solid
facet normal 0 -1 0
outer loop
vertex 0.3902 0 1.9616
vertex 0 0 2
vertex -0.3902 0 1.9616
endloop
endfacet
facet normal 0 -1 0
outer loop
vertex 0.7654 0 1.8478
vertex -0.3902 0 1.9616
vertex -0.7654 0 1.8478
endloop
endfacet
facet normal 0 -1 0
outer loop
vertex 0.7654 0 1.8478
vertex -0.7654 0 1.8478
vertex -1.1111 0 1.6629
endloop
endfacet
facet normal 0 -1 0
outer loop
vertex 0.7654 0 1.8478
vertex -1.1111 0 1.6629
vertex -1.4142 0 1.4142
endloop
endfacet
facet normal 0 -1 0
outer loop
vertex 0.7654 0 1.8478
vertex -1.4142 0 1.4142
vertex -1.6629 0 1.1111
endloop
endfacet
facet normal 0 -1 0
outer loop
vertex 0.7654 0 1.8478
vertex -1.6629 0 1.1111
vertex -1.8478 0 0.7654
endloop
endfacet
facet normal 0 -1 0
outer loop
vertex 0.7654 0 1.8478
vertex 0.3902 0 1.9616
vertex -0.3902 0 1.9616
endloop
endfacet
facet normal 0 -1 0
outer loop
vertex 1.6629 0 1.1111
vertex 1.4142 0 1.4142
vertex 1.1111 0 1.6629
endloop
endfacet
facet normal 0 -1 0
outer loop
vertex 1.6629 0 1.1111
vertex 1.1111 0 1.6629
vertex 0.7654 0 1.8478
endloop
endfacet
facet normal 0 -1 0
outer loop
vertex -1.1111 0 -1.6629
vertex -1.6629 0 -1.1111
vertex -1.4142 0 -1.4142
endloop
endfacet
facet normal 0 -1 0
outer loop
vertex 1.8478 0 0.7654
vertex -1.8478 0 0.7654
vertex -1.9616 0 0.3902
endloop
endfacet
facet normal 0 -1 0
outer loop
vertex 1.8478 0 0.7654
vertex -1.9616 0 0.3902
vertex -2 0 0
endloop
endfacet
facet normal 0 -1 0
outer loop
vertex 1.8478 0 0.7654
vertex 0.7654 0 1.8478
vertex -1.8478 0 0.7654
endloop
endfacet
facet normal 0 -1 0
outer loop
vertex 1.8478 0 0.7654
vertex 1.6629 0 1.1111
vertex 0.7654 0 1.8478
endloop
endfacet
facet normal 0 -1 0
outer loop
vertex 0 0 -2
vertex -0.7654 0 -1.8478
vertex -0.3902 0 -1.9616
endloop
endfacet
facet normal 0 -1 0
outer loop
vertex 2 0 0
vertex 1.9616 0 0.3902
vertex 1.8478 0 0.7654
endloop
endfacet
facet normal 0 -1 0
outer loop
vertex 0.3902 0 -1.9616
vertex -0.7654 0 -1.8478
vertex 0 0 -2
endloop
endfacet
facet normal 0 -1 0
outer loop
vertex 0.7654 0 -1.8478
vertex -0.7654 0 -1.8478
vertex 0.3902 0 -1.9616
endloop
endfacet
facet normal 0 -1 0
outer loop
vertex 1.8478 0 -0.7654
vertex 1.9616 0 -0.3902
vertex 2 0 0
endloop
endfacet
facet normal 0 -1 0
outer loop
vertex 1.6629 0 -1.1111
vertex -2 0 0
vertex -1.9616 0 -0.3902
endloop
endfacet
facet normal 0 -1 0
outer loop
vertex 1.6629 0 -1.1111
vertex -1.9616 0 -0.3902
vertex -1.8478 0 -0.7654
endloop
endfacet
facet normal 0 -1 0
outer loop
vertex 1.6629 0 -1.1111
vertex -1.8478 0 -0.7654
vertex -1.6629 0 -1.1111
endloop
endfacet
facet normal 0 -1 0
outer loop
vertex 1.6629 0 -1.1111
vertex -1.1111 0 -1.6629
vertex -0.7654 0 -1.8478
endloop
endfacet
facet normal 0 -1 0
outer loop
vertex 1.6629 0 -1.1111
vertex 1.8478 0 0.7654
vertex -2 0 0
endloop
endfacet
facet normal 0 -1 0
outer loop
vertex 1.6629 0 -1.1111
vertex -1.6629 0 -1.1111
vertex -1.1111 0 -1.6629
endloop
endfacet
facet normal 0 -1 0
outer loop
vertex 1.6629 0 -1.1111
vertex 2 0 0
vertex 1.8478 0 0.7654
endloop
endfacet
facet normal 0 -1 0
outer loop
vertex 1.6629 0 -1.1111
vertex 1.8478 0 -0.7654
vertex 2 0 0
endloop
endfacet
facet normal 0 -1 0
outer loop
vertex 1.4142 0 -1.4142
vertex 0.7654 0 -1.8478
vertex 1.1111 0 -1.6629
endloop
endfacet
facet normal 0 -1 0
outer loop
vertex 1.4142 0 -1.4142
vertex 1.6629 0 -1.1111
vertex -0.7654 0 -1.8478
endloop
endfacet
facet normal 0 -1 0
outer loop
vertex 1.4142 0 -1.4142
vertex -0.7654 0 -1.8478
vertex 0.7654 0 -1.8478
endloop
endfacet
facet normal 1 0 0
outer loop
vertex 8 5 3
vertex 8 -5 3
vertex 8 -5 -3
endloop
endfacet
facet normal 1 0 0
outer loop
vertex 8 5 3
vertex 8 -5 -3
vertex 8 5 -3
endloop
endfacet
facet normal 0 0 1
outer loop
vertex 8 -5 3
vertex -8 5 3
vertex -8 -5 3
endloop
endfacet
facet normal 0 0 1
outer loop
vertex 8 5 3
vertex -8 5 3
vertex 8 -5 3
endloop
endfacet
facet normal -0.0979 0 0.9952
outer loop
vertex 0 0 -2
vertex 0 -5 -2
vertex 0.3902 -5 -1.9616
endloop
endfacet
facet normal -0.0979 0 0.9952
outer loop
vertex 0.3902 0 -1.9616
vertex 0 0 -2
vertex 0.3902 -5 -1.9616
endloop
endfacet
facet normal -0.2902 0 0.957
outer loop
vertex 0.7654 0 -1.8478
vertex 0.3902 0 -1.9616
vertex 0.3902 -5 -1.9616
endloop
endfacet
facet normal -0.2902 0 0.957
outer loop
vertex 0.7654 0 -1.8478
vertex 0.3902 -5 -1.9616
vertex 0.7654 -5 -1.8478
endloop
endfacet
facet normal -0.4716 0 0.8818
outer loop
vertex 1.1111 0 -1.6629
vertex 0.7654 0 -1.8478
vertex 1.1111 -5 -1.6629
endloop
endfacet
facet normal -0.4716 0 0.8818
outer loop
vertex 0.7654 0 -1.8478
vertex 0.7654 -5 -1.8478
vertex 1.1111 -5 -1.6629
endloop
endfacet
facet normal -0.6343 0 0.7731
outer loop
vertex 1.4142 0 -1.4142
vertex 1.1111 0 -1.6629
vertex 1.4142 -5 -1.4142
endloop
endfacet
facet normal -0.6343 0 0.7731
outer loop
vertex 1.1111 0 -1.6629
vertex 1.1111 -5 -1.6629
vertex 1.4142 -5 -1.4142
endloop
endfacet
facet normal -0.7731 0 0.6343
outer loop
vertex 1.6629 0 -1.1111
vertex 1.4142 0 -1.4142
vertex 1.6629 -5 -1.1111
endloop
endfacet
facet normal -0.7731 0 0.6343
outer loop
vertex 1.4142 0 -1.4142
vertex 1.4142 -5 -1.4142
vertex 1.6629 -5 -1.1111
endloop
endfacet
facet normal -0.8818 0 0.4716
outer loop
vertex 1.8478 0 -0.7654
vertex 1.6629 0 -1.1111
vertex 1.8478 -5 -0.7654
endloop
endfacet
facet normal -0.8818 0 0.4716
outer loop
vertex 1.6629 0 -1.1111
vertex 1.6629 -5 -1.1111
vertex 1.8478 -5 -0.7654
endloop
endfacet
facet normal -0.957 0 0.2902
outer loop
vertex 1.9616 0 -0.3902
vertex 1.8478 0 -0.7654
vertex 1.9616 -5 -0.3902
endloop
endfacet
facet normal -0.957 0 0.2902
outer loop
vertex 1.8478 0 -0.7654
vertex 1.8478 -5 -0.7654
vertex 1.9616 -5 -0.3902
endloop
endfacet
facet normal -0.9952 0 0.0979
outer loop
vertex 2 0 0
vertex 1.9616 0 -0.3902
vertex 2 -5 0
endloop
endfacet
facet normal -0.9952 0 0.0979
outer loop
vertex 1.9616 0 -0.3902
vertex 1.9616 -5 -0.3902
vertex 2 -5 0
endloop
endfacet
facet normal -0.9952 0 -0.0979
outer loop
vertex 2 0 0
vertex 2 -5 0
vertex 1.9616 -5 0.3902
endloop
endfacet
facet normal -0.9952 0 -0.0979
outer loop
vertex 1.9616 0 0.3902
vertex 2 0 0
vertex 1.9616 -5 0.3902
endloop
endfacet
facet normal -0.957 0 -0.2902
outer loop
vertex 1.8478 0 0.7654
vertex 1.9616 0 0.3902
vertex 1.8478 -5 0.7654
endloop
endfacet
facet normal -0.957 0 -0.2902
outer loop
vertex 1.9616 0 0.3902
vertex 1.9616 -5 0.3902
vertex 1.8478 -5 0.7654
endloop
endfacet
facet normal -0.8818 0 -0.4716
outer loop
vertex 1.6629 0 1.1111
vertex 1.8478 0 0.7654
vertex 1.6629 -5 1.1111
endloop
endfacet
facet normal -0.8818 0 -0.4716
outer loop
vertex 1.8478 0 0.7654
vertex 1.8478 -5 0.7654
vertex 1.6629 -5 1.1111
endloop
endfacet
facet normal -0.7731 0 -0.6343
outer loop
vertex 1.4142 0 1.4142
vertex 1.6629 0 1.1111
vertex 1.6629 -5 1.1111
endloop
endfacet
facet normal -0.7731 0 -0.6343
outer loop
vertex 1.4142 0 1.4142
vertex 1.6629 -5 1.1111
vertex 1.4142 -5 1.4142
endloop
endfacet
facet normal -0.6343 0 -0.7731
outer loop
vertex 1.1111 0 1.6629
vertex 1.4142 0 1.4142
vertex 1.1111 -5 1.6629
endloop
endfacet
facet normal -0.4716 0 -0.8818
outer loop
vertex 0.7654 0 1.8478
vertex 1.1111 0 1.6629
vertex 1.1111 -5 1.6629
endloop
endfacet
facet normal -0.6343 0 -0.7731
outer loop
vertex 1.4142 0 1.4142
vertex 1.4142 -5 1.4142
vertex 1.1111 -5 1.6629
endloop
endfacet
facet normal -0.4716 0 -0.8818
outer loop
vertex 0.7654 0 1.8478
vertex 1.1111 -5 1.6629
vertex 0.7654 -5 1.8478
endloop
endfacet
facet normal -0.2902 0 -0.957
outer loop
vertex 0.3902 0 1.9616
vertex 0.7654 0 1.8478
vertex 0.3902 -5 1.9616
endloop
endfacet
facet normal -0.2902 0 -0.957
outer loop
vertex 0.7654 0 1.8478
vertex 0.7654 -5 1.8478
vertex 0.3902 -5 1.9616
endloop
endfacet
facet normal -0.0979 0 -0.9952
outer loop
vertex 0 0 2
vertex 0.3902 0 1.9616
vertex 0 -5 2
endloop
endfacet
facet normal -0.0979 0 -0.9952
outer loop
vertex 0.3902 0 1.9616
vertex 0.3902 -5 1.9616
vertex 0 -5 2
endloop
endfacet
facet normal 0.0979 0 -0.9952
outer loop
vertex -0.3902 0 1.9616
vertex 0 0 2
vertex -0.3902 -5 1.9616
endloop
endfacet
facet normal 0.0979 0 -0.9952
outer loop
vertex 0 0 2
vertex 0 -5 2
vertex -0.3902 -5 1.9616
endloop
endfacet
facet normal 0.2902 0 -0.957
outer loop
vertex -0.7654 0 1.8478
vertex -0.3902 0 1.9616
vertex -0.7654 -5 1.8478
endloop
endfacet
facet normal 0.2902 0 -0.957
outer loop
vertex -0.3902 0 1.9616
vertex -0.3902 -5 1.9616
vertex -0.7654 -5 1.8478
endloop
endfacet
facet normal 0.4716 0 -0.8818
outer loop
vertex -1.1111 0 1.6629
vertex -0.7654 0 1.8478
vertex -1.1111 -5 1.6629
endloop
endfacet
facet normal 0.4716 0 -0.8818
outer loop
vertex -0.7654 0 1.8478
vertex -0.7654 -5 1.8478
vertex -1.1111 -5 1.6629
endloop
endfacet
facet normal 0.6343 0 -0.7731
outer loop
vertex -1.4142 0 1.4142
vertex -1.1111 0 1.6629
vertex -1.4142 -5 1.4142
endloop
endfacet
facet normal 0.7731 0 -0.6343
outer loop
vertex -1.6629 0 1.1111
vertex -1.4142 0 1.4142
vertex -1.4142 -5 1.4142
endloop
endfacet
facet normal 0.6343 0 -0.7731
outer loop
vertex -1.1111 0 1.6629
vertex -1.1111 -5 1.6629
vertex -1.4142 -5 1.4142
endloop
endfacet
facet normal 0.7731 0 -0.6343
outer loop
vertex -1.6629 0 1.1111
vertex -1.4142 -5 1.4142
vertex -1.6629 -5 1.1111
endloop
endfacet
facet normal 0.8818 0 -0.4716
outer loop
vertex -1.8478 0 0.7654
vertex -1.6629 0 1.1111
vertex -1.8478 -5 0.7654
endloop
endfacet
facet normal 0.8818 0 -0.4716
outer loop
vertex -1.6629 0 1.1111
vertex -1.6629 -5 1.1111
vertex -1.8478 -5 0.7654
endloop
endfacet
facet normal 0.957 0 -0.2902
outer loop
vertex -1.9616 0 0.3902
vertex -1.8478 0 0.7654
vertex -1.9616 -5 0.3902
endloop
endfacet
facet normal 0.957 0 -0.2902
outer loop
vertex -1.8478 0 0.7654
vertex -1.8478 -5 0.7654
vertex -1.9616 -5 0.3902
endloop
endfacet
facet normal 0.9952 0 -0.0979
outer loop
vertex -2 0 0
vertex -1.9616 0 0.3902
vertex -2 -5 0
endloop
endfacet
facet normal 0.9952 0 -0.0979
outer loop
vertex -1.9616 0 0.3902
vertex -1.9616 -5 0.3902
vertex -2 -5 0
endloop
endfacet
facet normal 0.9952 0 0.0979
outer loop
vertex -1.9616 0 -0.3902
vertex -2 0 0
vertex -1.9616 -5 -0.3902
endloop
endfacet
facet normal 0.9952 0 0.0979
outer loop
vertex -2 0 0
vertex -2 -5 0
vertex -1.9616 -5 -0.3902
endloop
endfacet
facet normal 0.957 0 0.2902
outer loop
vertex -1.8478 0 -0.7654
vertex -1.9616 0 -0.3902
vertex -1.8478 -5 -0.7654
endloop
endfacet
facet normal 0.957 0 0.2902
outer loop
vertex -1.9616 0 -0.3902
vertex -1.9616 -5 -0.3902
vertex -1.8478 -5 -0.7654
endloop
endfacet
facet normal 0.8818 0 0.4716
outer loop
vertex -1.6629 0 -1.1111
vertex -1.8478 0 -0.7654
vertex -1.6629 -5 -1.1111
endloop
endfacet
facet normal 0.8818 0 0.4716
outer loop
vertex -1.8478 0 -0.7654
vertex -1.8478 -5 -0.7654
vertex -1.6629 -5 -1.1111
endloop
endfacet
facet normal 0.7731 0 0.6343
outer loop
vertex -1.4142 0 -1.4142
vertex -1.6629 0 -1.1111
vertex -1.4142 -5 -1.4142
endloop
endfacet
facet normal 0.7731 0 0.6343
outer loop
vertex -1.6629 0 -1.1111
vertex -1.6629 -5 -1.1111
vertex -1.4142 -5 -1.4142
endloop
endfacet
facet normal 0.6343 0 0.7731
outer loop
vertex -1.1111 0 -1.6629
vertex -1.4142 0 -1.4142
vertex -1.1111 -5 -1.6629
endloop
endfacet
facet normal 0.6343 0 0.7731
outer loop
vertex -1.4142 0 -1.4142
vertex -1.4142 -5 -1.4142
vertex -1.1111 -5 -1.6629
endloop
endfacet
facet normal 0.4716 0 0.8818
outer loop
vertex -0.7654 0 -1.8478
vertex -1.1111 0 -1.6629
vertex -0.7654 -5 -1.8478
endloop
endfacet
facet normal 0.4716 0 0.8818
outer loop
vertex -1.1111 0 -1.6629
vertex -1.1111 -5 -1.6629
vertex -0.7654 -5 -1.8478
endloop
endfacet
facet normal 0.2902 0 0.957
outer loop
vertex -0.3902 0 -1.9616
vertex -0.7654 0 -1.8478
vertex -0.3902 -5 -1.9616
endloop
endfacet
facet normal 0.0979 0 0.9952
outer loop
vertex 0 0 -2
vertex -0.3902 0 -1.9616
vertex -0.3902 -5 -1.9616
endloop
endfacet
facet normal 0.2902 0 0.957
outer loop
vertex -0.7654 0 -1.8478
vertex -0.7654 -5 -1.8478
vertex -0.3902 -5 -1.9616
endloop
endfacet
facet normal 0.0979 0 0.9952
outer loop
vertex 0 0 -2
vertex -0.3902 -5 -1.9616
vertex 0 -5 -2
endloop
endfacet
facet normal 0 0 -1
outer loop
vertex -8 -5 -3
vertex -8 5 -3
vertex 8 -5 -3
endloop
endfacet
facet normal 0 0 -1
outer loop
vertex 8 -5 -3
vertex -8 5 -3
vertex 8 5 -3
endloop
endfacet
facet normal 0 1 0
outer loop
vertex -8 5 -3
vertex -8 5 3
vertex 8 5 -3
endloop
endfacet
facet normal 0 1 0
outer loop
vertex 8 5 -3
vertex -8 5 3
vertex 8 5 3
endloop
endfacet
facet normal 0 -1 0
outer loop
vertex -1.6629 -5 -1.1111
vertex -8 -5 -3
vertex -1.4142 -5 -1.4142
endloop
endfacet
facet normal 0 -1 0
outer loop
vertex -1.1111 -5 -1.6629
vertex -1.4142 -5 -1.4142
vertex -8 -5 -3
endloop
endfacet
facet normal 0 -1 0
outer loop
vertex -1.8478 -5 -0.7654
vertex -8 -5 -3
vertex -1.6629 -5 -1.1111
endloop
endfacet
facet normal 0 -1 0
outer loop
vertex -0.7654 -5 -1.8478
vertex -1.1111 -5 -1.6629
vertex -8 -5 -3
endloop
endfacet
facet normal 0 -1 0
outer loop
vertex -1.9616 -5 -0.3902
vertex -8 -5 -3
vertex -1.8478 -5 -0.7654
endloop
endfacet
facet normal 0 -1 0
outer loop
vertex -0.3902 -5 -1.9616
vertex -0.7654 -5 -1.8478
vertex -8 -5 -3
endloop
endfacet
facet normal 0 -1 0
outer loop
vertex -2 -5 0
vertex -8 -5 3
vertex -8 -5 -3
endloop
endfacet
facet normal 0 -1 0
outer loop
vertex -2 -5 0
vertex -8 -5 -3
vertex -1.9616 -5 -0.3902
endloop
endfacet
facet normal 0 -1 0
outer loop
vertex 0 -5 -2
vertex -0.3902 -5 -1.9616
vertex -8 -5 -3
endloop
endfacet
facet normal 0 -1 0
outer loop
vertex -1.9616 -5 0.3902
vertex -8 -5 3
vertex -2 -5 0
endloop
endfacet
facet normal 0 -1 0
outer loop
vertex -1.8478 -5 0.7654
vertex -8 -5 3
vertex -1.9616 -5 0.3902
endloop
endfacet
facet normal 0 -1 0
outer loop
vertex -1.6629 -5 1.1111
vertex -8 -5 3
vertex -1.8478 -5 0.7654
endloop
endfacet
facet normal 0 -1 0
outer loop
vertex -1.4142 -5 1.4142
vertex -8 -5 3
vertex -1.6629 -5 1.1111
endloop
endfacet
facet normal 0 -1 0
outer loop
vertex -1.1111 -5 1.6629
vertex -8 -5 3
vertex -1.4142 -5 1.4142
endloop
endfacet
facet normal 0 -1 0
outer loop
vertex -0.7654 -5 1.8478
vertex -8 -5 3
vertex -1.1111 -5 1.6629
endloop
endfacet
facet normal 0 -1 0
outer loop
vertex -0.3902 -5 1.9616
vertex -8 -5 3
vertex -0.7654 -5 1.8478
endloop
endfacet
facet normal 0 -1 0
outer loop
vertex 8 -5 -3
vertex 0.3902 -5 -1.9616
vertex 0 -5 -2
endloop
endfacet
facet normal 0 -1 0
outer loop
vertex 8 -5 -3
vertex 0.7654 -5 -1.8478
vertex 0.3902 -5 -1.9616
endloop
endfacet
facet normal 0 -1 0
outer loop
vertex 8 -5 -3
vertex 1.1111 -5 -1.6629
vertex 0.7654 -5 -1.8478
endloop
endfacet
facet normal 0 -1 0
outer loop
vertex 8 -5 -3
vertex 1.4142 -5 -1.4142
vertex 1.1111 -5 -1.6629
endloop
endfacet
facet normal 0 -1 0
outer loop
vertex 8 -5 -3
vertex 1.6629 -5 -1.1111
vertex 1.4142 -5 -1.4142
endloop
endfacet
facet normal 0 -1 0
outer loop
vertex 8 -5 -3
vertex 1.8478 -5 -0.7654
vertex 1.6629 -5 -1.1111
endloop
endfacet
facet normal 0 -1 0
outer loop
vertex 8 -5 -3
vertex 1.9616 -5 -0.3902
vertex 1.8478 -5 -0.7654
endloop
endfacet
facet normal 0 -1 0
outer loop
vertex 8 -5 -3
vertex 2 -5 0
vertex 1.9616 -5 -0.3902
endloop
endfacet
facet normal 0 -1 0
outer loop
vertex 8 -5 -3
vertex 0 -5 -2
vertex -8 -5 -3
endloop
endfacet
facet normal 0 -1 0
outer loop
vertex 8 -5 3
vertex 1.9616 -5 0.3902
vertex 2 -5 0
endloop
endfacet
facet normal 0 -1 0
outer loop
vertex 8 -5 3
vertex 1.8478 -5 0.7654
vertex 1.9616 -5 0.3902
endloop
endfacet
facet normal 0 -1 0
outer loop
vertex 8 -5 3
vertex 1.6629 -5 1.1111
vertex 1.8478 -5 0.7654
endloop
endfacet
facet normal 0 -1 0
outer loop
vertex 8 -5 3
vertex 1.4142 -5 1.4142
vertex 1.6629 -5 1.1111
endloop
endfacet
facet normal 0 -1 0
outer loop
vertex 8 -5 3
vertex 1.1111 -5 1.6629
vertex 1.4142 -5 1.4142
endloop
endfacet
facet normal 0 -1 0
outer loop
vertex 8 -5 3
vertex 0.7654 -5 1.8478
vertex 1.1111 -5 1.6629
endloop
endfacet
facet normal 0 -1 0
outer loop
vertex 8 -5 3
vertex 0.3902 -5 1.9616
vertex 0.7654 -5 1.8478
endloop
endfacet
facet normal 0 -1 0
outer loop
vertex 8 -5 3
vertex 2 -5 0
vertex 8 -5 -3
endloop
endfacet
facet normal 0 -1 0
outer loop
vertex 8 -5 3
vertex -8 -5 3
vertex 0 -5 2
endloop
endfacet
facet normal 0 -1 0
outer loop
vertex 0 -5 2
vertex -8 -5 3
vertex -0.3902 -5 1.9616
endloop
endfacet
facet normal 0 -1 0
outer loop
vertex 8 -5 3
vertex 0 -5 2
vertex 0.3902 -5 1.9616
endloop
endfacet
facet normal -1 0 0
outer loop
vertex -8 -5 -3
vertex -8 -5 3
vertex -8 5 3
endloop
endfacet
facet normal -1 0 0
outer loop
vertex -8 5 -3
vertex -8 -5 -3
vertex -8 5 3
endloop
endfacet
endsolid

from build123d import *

# Parameters (mm, degrees)
SKETCH_1_W          = 16
SKETCH_1_H          = 10
EXTRUDE_1_DEPTH     = 3
SKETCH_2_R          = 2
CUT_EXTRUDE_1_DEPTH = 5


with BuildPart() as part:
    # 스케치1 → 보스-돌출1 (new, symmetric)
    with BuildSketch(Plane.XY):
        Rectangle(SKETCH_1_W, SKETCH_1_H)
    extrude(amount=EXTRUDE_1_DEPTH, both=True)

    # 스케치2 → 컷-돌출1 (cut)
    with BuildSketch(Plane.XZ.offset(5)):
        with Locations(Location((0, 0, 0), (0, 0, 270))):
            Circle(SKETCH_2_R)
    extrude(amount=-CUT_EXTRUDE_1_DEPTH, mode=Mode.SUBTRACT)


solid = part.part
